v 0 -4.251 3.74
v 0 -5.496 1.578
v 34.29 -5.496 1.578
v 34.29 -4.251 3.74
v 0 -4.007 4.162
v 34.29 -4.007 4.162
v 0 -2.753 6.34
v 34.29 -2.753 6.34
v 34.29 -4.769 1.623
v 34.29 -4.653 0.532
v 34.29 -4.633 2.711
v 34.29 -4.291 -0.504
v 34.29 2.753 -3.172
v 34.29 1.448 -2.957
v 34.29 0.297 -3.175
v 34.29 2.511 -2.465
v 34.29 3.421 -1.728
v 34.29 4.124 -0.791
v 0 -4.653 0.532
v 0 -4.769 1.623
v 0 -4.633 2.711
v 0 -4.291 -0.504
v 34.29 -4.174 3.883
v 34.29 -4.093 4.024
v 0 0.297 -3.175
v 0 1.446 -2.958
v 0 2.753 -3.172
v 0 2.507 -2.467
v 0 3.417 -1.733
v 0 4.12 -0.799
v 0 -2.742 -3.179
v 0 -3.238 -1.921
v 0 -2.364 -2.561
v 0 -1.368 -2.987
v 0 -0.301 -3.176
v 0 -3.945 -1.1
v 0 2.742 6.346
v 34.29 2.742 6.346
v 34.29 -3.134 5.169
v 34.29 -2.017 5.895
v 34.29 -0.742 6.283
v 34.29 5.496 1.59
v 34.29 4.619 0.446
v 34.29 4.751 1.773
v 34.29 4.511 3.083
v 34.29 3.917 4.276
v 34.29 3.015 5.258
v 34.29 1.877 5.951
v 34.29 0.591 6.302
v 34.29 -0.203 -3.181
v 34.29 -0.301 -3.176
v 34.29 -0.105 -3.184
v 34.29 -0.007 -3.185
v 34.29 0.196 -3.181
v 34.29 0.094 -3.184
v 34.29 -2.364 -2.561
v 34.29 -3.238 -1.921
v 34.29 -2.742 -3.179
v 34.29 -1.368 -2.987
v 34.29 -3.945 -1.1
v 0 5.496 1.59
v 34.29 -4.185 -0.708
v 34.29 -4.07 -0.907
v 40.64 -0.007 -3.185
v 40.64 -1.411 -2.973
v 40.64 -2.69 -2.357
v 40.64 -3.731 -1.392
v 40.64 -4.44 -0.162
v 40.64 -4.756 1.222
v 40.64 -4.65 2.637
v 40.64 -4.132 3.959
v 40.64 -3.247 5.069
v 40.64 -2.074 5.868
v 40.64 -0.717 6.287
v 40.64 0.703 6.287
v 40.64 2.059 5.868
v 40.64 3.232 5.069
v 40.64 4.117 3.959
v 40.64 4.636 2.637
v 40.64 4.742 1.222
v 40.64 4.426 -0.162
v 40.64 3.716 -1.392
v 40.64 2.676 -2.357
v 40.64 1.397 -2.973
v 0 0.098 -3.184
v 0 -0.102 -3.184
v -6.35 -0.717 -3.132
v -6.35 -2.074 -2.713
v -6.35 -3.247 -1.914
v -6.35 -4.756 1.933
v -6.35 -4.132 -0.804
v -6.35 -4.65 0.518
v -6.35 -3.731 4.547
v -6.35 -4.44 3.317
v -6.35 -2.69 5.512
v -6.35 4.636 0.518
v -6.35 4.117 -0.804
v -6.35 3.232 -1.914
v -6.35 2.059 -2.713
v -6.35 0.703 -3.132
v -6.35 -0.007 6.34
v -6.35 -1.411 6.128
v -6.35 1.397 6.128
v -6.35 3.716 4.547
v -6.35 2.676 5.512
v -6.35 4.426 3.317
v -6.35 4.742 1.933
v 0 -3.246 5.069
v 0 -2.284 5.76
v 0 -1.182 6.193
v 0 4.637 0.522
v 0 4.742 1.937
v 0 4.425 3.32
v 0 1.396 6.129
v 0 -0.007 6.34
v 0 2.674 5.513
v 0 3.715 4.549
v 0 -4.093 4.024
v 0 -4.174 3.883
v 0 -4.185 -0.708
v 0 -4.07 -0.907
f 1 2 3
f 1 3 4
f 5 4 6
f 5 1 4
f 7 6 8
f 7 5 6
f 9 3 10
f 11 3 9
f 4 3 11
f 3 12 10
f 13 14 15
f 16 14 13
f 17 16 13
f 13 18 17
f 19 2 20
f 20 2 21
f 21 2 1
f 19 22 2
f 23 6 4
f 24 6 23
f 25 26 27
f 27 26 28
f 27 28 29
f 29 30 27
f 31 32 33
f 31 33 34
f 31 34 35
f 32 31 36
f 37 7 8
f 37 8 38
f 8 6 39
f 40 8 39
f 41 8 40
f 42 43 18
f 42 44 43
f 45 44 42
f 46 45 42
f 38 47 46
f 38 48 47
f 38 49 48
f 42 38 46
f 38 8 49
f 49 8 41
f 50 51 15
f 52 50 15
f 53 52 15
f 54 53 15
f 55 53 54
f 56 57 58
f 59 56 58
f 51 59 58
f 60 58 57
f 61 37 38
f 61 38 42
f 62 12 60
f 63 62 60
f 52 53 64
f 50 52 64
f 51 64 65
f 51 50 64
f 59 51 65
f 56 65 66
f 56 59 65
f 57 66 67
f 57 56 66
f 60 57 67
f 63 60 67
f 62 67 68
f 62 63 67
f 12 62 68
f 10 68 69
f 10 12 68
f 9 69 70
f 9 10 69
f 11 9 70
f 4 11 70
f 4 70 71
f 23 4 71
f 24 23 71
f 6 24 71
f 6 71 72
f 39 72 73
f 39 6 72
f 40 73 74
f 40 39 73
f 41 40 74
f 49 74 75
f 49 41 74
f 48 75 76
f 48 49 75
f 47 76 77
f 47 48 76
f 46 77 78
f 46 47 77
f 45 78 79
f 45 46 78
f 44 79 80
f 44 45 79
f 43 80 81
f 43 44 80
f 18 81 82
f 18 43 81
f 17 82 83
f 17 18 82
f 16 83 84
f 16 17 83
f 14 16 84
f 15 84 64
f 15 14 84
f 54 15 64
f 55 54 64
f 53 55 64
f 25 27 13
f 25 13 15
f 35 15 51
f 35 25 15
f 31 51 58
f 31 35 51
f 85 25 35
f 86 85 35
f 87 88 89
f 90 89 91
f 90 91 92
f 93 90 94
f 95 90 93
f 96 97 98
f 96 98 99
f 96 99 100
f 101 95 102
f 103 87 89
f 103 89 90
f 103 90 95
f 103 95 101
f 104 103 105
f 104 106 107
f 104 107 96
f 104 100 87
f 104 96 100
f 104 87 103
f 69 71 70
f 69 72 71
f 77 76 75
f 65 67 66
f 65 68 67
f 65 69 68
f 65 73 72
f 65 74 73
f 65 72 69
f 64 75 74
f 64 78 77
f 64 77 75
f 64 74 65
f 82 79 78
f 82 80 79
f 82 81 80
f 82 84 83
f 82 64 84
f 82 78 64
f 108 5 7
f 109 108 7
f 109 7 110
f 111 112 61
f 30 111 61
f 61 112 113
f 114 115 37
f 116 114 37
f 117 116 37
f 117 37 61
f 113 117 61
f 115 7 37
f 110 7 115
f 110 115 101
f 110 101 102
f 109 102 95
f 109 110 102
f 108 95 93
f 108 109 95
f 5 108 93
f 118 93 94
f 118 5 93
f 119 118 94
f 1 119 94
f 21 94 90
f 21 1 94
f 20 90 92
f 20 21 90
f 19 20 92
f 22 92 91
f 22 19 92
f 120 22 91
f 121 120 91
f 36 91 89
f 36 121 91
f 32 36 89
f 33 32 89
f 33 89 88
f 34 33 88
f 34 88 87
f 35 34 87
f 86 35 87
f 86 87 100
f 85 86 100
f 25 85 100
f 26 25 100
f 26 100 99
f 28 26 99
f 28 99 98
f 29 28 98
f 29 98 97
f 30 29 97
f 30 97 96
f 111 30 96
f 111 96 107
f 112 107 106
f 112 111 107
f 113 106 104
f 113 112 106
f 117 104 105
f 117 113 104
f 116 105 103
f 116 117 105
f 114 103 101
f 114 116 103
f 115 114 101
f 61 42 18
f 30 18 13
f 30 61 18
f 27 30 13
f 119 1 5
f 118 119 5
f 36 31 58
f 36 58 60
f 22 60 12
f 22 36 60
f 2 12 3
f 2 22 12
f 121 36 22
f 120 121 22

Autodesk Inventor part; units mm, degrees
ref_plane "YZ Plane" through (0, 0, 0) normal (1, 0, 0) x (0, 1, 0)
ref_plane "XZ Plane" through (0, 0, 0) normal (0, 1, 0) x (-1, 0, 0)
ref_plane "XY Plane" through (0, 0, 0) normal (0, 0, 1) x (1, 0, 0)
sketch "Sketch1" plane through (0, 0, 0) normal (1, 0, 0) x (0, 1, 0)
  line L0 (0, 1.5838) -> (0, -3.1787)
  line L1 (-2.7424, -3.1787) -> (-5.4957, 1.5775)
  line L2 (-5.4957, 1.5775) -> (-2.7532, 6.34)
  line L3 (-2.7532, 6.34) -> (2.7424, 6.3463)
  line L4 (2.7424, 6.3463) -> (5.4957, 1.59)
  line L5 (5.4957, 1.59) -> (2.7532, -3.1725)
  line L6 (2.7532, -3.1725) -> (-2.7424, -3.1787)
  point P0 (0, 0)
  dimension "d0" = 4.7625
extrude "Extrusion1" add sketch "Sketch1" along normal blind 34.29
sketch "Sketch2" plane through (34.29, 0, 0) normal (1, 0, 0) x (0, 0, -1)
  line L0 (3.1725, 2.7532) -> (-1.59, 5.4957) projected
  line L1 (0.7913, 4.1244) -> (-1.5775, -0.0072)
  circle A0 centre (-1.5775, -0.0072) radius 4.7625
  point P0 (0, 0)
  dimension "d3" = 4.7625
extrude "Extrusion2" add sketch "Sketch2" along normal blind 6.35
sketch "Sketch3" plane through (0, 0, 0) normal (-1, 0, 0) x (0, 0, 1)
  line L0 (-1.0999, -3.9458) -> (-3.1787, -2.7424) construction
  arc A0 (4.1618, -4.0075) -> (-0.799, 4.12) centre (1.5775, -0.0072) ccw construction
  line L1 (-1.0999, -3.9458) -> (1.5775, -0.0072) construction
  circle A1 centre (1.5775, -0.0072) radius 4.7625
  point P0 (0, 0)
  dimension "d6" = 4.7625
extrude "Extrusion3" add sketch "Sketch3" along normal blind 6.35
properties part number "Hex Shaft"
